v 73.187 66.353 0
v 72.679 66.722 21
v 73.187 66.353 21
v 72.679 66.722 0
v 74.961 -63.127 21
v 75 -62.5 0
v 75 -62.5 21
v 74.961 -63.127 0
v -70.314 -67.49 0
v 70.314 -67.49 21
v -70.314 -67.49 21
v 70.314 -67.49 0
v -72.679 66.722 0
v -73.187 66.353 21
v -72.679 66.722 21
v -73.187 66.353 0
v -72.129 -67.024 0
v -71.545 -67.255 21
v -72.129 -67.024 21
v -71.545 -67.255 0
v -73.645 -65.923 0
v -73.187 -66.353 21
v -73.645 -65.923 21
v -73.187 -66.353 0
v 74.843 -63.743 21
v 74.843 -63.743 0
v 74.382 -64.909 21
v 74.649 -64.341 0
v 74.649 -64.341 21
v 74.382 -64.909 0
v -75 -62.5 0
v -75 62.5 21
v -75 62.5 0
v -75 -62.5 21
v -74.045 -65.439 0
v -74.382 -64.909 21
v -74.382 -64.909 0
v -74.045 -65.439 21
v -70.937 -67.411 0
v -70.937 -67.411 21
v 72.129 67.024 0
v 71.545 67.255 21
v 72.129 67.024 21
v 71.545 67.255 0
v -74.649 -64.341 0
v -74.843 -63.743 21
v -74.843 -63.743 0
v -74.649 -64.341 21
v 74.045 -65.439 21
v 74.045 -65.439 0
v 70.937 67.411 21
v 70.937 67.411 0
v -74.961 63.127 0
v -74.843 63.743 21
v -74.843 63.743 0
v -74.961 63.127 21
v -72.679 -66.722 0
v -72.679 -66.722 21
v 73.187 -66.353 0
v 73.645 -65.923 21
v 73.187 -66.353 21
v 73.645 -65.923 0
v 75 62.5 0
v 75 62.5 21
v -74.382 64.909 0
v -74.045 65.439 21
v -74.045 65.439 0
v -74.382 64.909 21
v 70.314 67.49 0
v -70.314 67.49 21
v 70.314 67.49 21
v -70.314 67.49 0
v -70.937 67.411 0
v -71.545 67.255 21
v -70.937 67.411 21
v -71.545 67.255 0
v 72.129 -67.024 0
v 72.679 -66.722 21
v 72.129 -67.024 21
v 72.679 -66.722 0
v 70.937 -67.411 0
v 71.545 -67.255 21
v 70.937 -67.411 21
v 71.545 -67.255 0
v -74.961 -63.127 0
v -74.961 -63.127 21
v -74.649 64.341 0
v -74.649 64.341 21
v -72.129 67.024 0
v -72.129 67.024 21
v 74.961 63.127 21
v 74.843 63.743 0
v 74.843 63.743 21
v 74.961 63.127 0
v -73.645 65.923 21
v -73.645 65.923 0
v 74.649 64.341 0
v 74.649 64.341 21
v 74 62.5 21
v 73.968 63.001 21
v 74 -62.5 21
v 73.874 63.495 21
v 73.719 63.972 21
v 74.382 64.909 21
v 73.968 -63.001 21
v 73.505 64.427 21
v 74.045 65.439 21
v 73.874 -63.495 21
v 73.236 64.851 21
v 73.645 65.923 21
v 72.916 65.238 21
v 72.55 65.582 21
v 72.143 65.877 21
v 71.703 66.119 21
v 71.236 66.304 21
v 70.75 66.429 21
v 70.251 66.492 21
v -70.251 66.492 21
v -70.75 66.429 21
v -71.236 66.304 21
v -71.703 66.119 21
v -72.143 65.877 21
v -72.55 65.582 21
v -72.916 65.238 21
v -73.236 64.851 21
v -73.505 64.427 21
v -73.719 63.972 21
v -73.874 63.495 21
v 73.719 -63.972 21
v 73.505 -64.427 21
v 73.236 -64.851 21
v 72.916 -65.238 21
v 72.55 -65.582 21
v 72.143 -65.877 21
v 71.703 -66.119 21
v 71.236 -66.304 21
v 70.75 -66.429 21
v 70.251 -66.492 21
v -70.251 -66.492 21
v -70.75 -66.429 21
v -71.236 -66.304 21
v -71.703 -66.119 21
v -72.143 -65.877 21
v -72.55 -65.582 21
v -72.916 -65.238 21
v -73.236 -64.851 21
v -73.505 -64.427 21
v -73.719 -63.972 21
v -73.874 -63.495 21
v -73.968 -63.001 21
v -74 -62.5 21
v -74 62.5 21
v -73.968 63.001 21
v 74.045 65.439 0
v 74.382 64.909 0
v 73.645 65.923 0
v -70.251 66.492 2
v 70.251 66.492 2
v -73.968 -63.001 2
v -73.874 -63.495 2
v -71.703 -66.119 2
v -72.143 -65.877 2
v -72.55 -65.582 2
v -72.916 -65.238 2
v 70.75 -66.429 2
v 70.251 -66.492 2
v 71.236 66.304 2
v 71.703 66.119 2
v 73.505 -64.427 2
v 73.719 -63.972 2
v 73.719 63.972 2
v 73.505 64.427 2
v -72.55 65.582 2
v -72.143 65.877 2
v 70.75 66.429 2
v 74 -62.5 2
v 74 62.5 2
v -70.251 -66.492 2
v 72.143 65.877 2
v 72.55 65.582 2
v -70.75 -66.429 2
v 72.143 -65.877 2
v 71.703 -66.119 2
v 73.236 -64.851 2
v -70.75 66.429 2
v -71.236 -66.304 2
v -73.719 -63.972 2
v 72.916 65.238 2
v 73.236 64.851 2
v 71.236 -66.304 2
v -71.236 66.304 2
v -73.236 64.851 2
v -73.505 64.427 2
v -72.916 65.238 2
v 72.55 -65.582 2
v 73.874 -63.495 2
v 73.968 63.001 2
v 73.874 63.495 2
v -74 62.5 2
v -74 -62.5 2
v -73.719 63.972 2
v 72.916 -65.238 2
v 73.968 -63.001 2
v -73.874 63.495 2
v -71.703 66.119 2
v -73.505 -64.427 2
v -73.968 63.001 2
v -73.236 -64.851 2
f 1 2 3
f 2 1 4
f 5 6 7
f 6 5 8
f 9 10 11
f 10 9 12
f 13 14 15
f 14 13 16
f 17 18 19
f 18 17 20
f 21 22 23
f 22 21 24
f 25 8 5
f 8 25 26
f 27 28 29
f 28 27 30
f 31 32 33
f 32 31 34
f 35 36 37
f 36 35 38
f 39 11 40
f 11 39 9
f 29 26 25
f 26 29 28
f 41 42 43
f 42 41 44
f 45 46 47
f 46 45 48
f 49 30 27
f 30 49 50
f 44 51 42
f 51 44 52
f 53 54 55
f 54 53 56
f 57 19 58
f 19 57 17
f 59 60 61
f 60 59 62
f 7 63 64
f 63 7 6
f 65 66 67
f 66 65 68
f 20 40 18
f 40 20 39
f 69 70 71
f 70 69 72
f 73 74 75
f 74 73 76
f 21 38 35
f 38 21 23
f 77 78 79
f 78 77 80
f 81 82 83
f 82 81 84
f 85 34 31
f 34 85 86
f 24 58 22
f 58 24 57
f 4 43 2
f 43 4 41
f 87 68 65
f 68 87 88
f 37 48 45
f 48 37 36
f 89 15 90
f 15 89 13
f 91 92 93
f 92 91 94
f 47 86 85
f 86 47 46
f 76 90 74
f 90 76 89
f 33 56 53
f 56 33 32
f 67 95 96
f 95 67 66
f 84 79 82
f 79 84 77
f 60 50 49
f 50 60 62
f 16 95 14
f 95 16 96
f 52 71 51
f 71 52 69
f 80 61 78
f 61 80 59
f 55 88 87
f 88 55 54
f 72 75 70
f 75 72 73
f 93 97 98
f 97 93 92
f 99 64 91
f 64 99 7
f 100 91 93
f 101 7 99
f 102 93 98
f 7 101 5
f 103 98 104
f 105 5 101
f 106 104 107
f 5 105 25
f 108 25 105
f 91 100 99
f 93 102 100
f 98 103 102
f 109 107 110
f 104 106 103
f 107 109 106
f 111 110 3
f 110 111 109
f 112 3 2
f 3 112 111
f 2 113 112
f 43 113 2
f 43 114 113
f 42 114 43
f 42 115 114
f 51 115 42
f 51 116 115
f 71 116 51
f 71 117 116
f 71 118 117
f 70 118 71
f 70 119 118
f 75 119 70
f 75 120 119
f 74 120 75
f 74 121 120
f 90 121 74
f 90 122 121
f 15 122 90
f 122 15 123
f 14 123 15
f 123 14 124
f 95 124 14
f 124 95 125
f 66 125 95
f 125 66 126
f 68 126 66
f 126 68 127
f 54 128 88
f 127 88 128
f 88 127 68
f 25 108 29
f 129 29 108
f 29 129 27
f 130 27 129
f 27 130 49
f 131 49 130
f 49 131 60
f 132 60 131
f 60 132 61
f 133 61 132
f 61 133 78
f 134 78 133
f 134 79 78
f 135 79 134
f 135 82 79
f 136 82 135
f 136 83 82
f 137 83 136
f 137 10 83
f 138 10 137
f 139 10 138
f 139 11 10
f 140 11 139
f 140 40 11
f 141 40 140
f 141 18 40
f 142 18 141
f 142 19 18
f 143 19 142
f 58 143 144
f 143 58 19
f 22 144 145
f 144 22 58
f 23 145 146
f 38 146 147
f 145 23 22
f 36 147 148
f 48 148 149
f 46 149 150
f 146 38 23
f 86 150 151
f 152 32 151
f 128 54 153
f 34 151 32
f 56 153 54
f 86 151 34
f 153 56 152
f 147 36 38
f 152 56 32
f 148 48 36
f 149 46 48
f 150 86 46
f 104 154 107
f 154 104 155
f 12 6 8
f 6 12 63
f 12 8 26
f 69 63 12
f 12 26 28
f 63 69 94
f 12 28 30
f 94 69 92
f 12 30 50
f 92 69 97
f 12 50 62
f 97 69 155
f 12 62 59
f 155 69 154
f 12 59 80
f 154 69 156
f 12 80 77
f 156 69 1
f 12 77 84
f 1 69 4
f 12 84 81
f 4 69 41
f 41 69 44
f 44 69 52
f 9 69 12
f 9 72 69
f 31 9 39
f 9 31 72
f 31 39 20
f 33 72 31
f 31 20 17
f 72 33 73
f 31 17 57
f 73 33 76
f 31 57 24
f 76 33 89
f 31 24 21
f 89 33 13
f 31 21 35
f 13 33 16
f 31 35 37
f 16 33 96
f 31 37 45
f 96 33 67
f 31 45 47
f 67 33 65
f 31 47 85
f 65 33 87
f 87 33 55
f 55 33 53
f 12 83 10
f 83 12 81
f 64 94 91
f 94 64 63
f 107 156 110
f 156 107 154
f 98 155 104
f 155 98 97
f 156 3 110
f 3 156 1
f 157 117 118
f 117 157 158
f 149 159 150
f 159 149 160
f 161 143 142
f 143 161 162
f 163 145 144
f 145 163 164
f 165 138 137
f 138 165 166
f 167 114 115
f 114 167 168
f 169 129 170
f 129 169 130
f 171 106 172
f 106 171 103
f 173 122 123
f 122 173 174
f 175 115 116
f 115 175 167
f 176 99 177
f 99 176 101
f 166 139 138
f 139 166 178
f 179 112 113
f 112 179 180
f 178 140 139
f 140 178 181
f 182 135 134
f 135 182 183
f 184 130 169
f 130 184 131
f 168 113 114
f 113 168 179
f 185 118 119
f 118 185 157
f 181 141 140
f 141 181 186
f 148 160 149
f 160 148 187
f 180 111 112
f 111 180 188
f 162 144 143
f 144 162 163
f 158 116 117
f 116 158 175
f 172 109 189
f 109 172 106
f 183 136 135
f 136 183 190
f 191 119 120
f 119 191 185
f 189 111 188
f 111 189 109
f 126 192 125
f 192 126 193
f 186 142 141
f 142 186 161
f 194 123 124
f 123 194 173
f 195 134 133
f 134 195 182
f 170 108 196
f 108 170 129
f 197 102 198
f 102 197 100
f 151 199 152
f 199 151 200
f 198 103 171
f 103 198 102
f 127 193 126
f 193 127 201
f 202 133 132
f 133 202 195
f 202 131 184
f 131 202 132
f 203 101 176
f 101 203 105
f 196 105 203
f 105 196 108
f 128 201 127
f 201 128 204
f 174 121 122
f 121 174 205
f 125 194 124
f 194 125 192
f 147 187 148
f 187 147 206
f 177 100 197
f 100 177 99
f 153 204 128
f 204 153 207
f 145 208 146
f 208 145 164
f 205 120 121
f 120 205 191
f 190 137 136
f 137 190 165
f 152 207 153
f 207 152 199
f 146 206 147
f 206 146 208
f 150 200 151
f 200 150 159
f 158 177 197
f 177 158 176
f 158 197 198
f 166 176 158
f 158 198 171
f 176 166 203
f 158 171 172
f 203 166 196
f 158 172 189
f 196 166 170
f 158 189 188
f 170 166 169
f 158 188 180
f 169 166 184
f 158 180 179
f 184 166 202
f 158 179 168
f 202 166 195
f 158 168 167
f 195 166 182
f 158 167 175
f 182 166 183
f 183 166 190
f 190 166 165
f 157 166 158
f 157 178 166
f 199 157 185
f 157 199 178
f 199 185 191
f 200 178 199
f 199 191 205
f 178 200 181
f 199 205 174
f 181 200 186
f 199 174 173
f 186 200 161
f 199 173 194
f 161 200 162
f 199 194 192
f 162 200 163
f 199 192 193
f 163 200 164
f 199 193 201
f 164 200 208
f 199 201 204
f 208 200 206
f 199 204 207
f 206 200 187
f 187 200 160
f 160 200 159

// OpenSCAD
$fn = 50;


difference() {
	union() {
		hull() {
			translate(v = [-70.0000000000, 62.5000000000, 0]) {
				cylinder(h = 21, r = 5);
			}
			translate(v = [70.0000000000, 62.5000000000, 0]) {
				cylinder(h = 21, r = 5);
			}
			translate(v = [-70.0000000000, -62.5000000000, 0]) {
				cylinder(h = 21, r = 5);
			}
			translate(v = [70.0000000000, -62.5000000000, 0]) {
				cylinder(h = 21, r = 5);
			}
		}
	}
	union() {
		translate(v = [0, 0, 2]) {
			hull() {
				translate(v = [-70.0000000000, 62.5000000000, 0]) {
					cylinder(h = 19, r = 4);
				}
				translate(v = [70.0000000000, 62.5000000000, 0]) {
					cylinder(h = 19, r = 4);
				}
				translate(v = [-70.0000000000, -62.5000000000, 0]) {
					cylinder(h = 19, r = 4);
				}
				translate(v = [70.0000000000, -62.5000000000, 0]) {
					cylinder(h = 19, r = 4);
				}
			}
		}
	}
}
